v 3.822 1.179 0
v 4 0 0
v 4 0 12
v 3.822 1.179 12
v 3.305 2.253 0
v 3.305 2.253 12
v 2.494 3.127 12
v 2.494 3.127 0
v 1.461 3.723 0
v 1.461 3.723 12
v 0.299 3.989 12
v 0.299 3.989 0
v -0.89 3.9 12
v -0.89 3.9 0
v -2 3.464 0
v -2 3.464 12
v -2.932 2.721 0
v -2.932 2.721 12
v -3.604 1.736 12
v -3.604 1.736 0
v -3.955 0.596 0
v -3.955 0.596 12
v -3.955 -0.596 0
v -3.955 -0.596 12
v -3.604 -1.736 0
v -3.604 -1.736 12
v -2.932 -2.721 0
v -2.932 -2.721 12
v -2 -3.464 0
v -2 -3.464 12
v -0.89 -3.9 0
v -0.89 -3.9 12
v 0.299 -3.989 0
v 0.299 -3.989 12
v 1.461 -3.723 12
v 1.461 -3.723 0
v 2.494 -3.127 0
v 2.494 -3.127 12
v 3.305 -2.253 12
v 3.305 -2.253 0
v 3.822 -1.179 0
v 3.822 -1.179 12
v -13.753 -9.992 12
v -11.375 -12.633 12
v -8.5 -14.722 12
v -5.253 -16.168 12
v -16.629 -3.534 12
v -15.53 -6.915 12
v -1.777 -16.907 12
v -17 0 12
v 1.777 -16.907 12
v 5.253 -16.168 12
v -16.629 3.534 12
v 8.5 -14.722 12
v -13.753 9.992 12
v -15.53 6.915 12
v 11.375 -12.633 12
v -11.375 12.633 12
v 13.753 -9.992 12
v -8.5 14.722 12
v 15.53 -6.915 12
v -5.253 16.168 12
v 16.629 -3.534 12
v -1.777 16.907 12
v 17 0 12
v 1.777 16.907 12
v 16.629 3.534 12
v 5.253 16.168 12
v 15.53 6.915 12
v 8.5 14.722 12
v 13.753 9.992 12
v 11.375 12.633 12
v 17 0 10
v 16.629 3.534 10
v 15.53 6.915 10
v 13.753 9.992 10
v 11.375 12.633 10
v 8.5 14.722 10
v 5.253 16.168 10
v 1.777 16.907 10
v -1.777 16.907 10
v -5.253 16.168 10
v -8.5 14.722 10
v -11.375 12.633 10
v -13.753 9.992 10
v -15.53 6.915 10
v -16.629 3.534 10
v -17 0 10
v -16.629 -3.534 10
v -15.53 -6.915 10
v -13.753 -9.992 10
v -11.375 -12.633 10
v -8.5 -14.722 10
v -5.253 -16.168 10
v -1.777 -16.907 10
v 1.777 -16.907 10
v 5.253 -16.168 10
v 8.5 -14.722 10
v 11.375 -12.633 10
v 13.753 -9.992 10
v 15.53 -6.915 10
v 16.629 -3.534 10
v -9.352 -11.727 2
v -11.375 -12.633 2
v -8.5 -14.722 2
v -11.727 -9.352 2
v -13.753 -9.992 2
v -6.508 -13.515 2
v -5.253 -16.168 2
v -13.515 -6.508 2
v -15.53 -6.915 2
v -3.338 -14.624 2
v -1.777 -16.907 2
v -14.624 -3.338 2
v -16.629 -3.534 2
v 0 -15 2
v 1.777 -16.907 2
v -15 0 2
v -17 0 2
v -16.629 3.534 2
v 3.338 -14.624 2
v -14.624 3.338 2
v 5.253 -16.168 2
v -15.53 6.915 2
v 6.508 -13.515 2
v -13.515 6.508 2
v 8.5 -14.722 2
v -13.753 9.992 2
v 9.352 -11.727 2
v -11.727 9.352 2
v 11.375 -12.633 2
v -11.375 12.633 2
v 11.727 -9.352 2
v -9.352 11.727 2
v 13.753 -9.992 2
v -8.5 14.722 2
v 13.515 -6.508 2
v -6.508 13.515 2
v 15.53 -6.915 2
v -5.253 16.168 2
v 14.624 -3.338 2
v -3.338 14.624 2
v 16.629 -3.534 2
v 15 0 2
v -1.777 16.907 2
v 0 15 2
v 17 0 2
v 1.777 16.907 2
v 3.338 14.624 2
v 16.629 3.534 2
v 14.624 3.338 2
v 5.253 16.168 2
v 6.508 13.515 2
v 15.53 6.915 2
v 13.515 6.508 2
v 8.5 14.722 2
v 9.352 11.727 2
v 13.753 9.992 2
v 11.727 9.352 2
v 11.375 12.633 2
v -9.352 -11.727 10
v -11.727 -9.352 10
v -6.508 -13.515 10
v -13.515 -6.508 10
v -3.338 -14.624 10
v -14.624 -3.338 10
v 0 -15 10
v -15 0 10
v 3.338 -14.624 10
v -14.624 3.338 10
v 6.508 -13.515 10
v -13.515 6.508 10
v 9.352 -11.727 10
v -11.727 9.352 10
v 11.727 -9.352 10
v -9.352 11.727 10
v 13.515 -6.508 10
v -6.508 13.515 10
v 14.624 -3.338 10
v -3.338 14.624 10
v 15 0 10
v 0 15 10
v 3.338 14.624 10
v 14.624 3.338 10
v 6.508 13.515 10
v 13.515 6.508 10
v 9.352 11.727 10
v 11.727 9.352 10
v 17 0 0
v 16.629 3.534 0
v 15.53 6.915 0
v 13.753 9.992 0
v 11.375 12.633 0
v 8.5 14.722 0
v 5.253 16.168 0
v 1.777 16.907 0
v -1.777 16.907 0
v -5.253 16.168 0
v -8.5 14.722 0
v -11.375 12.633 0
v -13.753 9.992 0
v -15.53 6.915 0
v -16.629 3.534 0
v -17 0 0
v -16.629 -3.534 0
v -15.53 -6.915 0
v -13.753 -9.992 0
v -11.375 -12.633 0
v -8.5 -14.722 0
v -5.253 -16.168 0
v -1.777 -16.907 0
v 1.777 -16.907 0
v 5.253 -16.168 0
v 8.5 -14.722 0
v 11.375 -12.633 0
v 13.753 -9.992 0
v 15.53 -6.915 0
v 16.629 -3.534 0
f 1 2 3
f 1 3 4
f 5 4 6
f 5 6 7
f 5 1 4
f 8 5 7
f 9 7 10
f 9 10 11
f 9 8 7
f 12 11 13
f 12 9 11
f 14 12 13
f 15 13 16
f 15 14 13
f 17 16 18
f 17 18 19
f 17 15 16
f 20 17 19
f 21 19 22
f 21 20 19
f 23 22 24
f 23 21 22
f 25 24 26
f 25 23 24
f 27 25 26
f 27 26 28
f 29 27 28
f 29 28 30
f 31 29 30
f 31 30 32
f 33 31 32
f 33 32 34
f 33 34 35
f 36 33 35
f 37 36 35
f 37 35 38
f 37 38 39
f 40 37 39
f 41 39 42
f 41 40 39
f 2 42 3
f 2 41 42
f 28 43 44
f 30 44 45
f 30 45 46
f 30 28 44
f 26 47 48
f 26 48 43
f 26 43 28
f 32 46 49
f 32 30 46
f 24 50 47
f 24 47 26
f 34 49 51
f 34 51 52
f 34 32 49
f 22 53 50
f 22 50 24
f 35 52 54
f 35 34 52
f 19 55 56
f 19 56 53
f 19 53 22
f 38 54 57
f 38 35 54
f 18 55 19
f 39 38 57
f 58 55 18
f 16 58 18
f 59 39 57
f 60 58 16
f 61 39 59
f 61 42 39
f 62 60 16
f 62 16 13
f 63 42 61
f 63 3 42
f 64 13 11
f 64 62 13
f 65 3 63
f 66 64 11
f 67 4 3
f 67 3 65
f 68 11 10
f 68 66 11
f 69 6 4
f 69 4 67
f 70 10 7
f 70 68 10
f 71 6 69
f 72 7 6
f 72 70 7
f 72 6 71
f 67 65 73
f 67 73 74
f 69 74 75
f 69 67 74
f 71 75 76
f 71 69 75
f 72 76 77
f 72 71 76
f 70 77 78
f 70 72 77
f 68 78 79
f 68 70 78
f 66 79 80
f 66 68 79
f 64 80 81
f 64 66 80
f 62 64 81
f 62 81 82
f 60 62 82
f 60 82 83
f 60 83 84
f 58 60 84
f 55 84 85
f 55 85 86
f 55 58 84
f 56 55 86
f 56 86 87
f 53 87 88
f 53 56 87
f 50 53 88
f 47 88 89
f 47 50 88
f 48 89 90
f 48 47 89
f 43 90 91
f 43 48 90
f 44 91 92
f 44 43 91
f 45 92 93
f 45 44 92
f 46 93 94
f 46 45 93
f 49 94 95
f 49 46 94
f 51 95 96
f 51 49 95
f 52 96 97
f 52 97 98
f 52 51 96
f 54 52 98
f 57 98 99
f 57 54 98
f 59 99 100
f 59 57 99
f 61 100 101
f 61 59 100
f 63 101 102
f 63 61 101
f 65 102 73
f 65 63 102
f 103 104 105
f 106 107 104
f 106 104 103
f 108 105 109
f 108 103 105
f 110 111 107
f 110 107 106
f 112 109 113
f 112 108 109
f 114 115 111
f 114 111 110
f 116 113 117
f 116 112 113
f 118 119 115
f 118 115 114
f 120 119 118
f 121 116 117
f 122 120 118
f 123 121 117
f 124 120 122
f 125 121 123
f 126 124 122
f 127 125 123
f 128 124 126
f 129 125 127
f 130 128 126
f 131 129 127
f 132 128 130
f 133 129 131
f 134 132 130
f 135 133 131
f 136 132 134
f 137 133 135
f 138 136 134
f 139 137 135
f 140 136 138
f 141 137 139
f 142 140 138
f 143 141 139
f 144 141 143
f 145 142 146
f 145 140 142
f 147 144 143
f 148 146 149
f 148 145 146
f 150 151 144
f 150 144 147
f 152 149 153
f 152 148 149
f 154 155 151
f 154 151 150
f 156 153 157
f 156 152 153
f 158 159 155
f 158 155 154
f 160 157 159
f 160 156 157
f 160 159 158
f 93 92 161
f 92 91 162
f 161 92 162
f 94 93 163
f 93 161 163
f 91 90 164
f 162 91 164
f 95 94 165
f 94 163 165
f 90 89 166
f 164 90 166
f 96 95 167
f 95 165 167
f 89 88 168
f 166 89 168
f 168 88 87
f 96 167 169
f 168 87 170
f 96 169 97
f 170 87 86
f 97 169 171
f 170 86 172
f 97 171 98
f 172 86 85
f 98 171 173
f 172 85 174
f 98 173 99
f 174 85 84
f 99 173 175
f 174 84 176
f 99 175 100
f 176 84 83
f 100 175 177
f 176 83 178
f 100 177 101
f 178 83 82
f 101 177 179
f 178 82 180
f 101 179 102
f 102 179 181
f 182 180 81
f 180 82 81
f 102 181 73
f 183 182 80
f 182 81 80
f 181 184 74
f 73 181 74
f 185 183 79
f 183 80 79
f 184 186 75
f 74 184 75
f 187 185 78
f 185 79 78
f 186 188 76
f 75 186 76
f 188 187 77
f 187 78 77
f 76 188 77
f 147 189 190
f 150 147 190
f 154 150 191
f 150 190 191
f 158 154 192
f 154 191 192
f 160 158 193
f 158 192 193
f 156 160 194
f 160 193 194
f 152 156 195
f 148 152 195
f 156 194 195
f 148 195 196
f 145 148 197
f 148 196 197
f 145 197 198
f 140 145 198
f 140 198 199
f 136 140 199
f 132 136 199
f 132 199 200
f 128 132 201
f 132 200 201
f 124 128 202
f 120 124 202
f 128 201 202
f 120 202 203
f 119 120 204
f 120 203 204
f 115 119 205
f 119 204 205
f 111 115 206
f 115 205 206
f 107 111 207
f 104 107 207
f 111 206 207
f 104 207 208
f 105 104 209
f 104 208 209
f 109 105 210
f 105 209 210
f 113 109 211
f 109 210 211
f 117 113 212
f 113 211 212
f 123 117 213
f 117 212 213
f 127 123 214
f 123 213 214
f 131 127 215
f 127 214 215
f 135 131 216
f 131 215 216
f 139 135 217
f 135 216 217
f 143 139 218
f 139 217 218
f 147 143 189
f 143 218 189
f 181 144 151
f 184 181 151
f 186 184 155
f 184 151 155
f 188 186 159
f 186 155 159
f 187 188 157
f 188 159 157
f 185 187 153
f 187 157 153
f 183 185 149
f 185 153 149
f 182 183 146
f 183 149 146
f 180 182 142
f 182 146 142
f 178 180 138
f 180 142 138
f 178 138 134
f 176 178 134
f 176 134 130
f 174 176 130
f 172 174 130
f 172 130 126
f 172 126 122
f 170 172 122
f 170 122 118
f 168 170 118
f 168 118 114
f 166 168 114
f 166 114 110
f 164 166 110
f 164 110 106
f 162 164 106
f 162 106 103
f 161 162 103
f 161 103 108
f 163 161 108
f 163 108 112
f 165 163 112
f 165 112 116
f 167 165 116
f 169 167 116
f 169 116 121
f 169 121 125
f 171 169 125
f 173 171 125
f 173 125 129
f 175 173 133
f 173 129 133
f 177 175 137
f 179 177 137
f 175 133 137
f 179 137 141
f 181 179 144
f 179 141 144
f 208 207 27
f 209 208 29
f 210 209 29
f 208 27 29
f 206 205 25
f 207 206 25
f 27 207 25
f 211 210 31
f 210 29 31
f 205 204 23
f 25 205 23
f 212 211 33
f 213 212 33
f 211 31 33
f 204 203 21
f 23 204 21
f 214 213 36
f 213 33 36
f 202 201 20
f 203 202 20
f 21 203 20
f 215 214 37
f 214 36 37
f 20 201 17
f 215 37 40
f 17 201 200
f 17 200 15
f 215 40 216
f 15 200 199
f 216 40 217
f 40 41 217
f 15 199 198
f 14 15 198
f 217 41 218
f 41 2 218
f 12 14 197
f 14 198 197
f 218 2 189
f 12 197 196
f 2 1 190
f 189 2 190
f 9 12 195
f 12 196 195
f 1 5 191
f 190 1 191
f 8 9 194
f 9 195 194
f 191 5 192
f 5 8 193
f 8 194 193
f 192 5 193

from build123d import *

# Parameters (mm, degrees)
F0_R     = 15
F0_R_2   = 4
F1_DEPTH = 12
F0_R_3   = 17
F2_DEPTH = 2
F3_R     = 17
F3_R_2   = 15
F4_DEPTH = 2


with BuildPart() as f1:
    # F0 (on Top) → F1 (new body)
    with BuildSketch(Plane.XY):
        Circle(F0_R)
        Circle(F0_R_2, mode=Mode.SUBTRACT)
    extrude(amount=F1_DEPTH)

    # F0 (on Top) → F2 (join)
    with BuildSketch(Plane.XY):
        Circle(F0_R_3)
        Circle(F0_R, mode=Mode.SUBTRACT)
    extrude(amount=F2_DEPTH)

    # F3 (on face) → F4 (join)
    with BuildSketch(Plane.XY.offset(12)):
        Circle(F3_R)
        Circle(F3_R_2, mode=Mode.SUBTRACT)
    extrude(amount=-F4_DEPTH)


solid = f1.part
